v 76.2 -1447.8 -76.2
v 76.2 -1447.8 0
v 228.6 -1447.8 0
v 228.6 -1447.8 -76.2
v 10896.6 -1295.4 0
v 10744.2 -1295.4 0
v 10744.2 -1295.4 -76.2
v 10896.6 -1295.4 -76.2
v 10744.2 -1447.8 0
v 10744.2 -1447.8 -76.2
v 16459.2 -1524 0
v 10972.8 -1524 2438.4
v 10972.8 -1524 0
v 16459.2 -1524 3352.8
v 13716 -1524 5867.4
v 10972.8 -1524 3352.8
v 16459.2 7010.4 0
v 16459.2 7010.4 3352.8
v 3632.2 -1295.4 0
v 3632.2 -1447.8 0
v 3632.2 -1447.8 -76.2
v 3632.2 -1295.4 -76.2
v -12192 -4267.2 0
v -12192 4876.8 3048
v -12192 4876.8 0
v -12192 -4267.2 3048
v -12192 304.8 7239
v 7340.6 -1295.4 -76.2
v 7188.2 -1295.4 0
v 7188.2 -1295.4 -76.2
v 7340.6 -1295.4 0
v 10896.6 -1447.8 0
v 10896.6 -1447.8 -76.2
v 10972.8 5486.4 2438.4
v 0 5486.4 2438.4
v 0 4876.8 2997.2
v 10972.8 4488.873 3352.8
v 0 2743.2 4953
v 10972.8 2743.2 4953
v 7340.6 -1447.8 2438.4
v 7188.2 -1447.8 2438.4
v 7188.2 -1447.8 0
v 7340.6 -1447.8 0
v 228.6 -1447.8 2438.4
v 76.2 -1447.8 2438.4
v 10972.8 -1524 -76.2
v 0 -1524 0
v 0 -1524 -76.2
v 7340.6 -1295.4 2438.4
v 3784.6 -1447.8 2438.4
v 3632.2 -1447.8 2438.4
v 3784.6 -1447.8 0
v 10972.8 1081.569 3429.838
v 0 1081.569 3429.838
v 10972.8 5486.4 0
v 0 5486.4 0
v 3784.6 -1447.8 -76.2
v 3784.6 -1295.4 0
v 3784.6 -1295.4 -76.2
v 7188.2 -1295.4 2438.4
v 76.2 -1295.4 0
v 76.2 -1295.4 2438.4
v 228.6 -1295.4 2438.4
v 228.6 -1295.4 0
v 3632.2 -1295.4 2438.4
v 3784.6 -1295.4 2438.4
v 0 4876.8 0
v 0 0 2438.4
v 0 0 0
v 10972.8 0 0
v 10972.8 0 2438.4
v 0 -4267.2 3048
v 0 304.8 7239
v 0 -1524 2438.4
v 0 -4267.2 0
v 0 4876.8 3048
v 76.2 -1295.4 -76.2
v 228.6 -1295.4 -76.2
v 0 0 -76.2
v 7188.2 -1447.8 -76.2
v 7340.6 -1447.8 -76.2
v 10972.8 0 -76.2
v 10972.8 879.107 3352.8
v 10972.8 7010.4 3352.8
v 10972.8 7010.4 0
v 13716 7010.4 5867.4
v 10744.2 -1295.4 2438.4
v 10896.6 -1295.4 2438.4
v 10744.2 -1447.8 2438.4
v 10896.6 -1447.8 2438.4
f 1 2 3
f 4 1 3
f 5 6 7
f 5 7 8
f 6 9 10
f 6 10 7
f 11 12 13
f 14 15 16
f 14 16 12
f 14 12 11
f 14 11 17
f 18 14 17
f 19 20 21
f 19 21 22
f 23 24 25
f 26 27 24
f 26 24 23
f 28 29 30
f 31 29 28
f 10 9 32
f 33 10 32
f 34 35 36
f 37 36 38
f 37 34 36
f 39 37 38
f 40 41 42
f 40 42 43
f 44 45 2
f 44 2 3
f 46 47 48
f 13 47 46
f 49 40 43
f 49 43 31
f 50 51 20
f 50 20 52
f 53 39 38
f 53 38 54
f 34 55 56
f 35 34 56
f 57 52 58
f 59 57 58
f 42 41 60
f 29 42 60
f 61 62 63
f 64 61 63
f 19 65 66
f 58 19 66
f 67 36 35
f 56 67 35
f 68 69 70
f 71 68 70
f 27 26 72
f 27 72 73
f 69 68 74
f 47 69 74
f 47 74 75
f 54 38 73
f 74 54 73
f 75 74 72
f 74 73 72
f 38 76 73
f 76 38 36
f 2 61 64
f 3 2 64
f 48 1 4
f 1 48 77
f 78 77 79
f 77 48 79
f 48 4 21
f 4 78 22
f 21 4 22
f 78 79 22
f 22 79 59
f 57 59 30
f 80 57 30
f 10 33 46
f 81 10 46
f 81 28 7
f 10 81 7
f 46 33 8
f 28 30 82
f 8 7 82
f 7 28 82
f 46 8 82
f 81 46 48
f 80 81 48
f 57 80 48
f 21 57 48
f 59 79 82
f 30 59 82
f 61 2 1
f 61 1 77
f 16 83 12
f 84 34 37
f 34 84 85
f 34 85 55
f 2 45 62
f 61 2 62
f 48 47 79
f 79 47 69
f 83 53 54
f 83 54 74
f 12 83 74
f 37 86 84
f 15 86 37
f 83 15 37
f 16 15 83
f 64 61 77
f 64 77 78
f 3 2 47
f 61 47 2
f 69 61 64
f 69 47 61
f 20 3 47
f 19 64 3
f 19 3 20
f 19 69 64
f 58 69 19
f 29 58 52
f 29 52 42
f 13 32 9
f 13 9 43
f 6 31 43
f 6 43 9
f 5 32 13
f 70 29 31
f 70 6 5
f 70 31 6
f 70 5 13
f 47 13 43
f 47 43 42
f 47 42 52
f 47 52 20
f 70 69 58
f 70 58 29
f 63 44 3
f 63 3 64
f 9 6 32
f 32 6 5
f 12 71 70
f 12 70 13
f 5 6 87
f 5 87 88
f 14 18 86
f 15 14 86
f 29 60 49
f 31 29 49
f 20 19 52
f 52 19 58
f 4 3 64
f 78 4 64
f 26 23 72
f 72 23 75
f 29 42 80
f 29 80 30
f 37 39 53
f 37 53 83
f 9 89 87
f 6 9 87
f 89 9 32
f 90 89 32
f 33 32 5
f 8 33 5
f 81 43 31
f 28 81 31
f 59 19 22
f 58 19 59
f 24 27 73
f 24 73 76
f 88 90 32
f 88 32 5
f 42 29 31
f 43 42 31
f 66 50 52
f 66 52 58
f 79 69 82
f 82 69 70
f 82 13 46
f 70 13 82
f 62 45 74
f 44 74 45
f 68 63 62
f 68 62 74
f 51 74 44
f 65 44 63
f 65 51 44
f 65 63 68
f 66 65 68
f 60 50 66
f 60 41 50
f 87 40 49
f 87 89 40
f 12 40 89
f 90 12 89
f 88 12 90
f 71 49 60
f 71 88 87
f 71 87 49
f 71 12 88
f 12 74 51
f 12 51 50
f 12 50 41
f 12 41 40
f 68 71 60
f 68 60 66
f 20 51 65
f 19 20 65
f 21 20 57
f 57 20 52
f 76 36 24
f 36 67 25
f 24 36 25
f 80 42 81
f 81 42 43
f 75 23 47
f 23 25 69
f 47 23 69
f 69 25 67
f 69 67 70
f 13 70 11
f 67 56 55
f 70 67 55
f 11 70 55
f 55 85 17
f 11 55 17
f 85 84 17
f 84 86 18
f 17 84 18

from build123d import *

# Parameters (mm, degrees)
F1_DEPTH  = 3048
F3_DEPTH  = 12192
F4_DEPTH  = 2438.4
F6_DEPTH  = 10972.8
F7_DEPTH  = 3352.8
F0_W      = 10972.8
F0_H      = 1524
F0_W_2    = 152.4
F0_H_2    = 152.4
F8_DEPTH  = 76.2
F9_DEPTH  = 2438.4
F11_DEPTH = 8534.4
F12_DEPTH = 2438.4
F13_DEPTH = 2438.4
F14_DEPTH = 2438.4


with BuildPart() as f1:
    # F0 (on Top) → F1 (new body)
    with BuildSketch(Plane.XY):
        Polygon((0, -1524), (0, 0), (0, 4876.8), (-12192, 4876.8), (-12192, -4267.2), (0, -4267.2), align=None)
    extrude(amount=F1_DEPTH)

    # F2 (on face) → F3 (join, through all)
    with BuildSketch(Plane(origin=(-12192, 0, 0), x_dir=(0, -1, 0), z_dir=(-1, 0, 0))):
        Polygon((4267.2, 3048), (-304.8, 7239), (-4876.8, 3048), align=None)
    extrude(amount=-F3_DEPTH)

    # F0 (on Top) → F4 (join)
    with BuildSketch(Plane.XY):
        Polygon((0, 4876.8), (0, 0), (10972.8, 0), (10972.8, 5486.4), (0, 5486.4), align=None)
    extrude(amount=F4_DEPTH)

    # F5 (on face) → F6 (join, through all)
    with BuildSketch(Plane.YZ.offset(10972.8)):
        Polygon((2743.2, 4953), (1081.5687689554, 3429.8380382092), (-1524, 2438.4), (0, 2438.4), (5486.4, 2438.4), align=None)
    extrude(amount=-F6_DEPTH)

    # F0 (on Top) → F7 (join)
    with BuildSketch(Plane.XY):
        Polygon((10972.8, 5486.4), (10972.8, 0), (10972.8, -1524), (16459.2, -1524), (16459.2, 7010.4), (10972.8, 7010.4), align=None)
    extrude(amount=F7_DEPTH)



with BuildPart() as f8:
    # F0 (on Top) → F8 (new body)
    with BuildSketch(Plane.XY):
        with Locations((5486.4, -762)):
            Rectangle(F0_W, F0_H)
        with Locations((152.4, -1371.6)):
            Rectangle(F0_W_2, F0_H_2, mode=Mode.SUBTRACT)
        with Locations((3708.4, -1371.6)):
            Rectangle(F0_W_2, F0_H_2, mode=Mode.SUBTRACT)
        with Locations((7264.4, -1371.6)):
            Rectangle(F0_W_2, F0_H_2, mode=Mode.SUBTRACT)
        with Locations((10820.4, -1371.6)):
            Rectangle(F0_W_2, F0_H_2, mode=Mode.SUBTRACT)
    extrude(amount=-F8_DEPTH)


with BuildPart() as f1_1:
    add(f1.part)

    add(f8.part)  # F9 merges F8
    # F0 (on Top) → F9 (join, through all)
    with BuildSketch(Plane.XY):
        with Locations((152.4, -1371.6)):
            Rectangle(F0_W_2, F0_H_2)
    extrude(amount=F9_DEPTH)

    # F10 (on face) → F11 (join, through all)
    with BuildSketch(Plane.XZ.offset(1524)):
        Polygon((13716, 5867.4), (10972.8, 3352.8), (16459.2, 3352.8), align=None)
    extrude(amount=-F11_DEPTH)

    # F0 (on Top) → F12 (join, through all)
    with BuildSketch(Plane.XY):
        with Locations((10820.4, -1371.6)):
            Rectangle(F0_W_2, F0_H_2)
    extrude(amount=F12_DEPTH)

    # F0 (on Top) → F13 (join, through all)
    with BuildSketch(Plane.XY):
        with Locations((7264.4, -1371.6)):
            Rectangle(F0_W_2, F0_H_2)
    extrude(amount=F13_DEPTH)

    # F0 (on Top) → F14 (join, through all)
    with BuildSketch(Plane.XY):
        with Locations((3708.4, -1371.6)):
            Rectangle(F0_W_2, F0_H_2)
    extrude(amount=F14_DEPTH)


solid = f1_1.part
